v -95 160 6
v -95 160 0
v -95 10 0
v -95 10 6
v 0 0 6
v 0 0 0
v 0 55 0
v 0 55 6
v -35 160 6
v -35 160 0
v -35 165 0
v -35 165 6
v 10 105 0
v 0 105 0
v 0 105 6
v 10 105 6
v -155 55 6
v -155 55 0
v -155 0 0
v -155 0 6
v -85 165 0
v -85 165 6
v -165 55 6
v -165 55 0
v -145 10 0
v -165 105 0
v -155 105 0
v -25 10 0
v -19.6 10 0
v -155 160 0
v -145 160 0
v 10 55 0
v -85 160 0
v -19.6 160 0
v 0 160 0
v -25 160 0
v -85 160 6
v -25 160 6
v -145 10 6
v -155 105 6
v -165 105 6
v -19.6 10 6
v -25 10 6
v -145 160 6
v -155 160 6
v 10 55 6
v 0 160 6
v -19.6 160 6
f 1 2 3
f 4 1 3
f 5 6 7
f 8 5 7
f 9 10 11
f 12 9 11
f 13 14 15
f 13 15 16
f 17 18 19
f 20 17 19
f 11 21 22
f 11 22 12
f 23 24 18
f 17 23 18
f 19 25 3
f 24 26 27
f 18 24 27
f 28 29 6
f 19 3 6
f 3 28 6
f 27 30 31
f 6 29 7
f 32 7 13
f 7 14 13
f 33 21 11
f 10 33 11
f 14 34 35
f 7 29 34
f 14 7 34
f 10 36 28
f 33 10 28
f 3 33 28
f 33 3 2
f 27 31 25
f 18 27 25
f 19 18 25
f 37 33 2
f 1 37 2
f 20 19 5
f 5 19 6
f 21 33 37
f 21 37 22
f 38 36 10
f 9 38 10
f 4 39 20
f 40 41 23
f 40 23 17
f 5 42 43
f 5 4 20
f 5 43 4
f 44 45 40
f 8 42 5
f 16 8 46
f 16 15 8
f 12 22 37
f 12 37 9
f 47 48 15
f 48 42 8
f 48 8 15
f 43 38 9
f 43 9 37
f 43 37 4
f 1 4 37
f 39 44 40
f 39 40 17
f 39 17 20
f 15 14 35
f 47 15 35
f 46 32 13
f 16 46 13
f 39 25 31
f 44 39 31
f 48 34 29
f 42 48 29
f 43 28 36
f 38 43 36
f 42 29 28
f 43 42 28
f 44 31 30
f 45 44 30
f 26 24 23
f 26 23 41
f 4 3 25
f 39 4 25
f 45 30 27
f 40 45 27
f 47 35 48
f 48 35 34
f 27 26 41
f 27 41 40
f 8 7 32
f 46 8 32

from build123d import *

# Parameters (mm, degrees)
SKETCH1_W           = 10
SKETCH1_H           = 50
SKETCH1_W_2         = 50
SKETCH1_H_2         = 5
BOSS_EXTRUDE1_DEPTH = 6


with BuildPart() as part:
    # Sketch1 → Boss-Extrude1 (new body)
    with BuildSketch(Plane.XY):
        Polygon((-155, 0), (0, 0), (0, 55), (0, 105), (0, 160), (-19.6, 160), (-19.6, 10), (-25, 10), (-25, 160), (-35, 160), (-72.61115591, 160), (-77.64696312, 160), (-85, 160), (-95, 160), (-95, 10), (-145, 10), (-145, 160), (-155, 160), (-155, 105), (-155, 55), align=None)
        with Locations((-160, 80)):
            Rectangle(SKETCH1_W, SKETCH1_H)
        with Locations((5, 80)):
            Rectangle(SKETCH1_W, SKETCH1_H)
        with Locations((-60, 162.5)):
            Rectangle(SKETCH1_W_2, SKETCH1_H_2)
    extrude(amount=BOSS_EXTRUDE1_DEPTH)


solid = part.part
